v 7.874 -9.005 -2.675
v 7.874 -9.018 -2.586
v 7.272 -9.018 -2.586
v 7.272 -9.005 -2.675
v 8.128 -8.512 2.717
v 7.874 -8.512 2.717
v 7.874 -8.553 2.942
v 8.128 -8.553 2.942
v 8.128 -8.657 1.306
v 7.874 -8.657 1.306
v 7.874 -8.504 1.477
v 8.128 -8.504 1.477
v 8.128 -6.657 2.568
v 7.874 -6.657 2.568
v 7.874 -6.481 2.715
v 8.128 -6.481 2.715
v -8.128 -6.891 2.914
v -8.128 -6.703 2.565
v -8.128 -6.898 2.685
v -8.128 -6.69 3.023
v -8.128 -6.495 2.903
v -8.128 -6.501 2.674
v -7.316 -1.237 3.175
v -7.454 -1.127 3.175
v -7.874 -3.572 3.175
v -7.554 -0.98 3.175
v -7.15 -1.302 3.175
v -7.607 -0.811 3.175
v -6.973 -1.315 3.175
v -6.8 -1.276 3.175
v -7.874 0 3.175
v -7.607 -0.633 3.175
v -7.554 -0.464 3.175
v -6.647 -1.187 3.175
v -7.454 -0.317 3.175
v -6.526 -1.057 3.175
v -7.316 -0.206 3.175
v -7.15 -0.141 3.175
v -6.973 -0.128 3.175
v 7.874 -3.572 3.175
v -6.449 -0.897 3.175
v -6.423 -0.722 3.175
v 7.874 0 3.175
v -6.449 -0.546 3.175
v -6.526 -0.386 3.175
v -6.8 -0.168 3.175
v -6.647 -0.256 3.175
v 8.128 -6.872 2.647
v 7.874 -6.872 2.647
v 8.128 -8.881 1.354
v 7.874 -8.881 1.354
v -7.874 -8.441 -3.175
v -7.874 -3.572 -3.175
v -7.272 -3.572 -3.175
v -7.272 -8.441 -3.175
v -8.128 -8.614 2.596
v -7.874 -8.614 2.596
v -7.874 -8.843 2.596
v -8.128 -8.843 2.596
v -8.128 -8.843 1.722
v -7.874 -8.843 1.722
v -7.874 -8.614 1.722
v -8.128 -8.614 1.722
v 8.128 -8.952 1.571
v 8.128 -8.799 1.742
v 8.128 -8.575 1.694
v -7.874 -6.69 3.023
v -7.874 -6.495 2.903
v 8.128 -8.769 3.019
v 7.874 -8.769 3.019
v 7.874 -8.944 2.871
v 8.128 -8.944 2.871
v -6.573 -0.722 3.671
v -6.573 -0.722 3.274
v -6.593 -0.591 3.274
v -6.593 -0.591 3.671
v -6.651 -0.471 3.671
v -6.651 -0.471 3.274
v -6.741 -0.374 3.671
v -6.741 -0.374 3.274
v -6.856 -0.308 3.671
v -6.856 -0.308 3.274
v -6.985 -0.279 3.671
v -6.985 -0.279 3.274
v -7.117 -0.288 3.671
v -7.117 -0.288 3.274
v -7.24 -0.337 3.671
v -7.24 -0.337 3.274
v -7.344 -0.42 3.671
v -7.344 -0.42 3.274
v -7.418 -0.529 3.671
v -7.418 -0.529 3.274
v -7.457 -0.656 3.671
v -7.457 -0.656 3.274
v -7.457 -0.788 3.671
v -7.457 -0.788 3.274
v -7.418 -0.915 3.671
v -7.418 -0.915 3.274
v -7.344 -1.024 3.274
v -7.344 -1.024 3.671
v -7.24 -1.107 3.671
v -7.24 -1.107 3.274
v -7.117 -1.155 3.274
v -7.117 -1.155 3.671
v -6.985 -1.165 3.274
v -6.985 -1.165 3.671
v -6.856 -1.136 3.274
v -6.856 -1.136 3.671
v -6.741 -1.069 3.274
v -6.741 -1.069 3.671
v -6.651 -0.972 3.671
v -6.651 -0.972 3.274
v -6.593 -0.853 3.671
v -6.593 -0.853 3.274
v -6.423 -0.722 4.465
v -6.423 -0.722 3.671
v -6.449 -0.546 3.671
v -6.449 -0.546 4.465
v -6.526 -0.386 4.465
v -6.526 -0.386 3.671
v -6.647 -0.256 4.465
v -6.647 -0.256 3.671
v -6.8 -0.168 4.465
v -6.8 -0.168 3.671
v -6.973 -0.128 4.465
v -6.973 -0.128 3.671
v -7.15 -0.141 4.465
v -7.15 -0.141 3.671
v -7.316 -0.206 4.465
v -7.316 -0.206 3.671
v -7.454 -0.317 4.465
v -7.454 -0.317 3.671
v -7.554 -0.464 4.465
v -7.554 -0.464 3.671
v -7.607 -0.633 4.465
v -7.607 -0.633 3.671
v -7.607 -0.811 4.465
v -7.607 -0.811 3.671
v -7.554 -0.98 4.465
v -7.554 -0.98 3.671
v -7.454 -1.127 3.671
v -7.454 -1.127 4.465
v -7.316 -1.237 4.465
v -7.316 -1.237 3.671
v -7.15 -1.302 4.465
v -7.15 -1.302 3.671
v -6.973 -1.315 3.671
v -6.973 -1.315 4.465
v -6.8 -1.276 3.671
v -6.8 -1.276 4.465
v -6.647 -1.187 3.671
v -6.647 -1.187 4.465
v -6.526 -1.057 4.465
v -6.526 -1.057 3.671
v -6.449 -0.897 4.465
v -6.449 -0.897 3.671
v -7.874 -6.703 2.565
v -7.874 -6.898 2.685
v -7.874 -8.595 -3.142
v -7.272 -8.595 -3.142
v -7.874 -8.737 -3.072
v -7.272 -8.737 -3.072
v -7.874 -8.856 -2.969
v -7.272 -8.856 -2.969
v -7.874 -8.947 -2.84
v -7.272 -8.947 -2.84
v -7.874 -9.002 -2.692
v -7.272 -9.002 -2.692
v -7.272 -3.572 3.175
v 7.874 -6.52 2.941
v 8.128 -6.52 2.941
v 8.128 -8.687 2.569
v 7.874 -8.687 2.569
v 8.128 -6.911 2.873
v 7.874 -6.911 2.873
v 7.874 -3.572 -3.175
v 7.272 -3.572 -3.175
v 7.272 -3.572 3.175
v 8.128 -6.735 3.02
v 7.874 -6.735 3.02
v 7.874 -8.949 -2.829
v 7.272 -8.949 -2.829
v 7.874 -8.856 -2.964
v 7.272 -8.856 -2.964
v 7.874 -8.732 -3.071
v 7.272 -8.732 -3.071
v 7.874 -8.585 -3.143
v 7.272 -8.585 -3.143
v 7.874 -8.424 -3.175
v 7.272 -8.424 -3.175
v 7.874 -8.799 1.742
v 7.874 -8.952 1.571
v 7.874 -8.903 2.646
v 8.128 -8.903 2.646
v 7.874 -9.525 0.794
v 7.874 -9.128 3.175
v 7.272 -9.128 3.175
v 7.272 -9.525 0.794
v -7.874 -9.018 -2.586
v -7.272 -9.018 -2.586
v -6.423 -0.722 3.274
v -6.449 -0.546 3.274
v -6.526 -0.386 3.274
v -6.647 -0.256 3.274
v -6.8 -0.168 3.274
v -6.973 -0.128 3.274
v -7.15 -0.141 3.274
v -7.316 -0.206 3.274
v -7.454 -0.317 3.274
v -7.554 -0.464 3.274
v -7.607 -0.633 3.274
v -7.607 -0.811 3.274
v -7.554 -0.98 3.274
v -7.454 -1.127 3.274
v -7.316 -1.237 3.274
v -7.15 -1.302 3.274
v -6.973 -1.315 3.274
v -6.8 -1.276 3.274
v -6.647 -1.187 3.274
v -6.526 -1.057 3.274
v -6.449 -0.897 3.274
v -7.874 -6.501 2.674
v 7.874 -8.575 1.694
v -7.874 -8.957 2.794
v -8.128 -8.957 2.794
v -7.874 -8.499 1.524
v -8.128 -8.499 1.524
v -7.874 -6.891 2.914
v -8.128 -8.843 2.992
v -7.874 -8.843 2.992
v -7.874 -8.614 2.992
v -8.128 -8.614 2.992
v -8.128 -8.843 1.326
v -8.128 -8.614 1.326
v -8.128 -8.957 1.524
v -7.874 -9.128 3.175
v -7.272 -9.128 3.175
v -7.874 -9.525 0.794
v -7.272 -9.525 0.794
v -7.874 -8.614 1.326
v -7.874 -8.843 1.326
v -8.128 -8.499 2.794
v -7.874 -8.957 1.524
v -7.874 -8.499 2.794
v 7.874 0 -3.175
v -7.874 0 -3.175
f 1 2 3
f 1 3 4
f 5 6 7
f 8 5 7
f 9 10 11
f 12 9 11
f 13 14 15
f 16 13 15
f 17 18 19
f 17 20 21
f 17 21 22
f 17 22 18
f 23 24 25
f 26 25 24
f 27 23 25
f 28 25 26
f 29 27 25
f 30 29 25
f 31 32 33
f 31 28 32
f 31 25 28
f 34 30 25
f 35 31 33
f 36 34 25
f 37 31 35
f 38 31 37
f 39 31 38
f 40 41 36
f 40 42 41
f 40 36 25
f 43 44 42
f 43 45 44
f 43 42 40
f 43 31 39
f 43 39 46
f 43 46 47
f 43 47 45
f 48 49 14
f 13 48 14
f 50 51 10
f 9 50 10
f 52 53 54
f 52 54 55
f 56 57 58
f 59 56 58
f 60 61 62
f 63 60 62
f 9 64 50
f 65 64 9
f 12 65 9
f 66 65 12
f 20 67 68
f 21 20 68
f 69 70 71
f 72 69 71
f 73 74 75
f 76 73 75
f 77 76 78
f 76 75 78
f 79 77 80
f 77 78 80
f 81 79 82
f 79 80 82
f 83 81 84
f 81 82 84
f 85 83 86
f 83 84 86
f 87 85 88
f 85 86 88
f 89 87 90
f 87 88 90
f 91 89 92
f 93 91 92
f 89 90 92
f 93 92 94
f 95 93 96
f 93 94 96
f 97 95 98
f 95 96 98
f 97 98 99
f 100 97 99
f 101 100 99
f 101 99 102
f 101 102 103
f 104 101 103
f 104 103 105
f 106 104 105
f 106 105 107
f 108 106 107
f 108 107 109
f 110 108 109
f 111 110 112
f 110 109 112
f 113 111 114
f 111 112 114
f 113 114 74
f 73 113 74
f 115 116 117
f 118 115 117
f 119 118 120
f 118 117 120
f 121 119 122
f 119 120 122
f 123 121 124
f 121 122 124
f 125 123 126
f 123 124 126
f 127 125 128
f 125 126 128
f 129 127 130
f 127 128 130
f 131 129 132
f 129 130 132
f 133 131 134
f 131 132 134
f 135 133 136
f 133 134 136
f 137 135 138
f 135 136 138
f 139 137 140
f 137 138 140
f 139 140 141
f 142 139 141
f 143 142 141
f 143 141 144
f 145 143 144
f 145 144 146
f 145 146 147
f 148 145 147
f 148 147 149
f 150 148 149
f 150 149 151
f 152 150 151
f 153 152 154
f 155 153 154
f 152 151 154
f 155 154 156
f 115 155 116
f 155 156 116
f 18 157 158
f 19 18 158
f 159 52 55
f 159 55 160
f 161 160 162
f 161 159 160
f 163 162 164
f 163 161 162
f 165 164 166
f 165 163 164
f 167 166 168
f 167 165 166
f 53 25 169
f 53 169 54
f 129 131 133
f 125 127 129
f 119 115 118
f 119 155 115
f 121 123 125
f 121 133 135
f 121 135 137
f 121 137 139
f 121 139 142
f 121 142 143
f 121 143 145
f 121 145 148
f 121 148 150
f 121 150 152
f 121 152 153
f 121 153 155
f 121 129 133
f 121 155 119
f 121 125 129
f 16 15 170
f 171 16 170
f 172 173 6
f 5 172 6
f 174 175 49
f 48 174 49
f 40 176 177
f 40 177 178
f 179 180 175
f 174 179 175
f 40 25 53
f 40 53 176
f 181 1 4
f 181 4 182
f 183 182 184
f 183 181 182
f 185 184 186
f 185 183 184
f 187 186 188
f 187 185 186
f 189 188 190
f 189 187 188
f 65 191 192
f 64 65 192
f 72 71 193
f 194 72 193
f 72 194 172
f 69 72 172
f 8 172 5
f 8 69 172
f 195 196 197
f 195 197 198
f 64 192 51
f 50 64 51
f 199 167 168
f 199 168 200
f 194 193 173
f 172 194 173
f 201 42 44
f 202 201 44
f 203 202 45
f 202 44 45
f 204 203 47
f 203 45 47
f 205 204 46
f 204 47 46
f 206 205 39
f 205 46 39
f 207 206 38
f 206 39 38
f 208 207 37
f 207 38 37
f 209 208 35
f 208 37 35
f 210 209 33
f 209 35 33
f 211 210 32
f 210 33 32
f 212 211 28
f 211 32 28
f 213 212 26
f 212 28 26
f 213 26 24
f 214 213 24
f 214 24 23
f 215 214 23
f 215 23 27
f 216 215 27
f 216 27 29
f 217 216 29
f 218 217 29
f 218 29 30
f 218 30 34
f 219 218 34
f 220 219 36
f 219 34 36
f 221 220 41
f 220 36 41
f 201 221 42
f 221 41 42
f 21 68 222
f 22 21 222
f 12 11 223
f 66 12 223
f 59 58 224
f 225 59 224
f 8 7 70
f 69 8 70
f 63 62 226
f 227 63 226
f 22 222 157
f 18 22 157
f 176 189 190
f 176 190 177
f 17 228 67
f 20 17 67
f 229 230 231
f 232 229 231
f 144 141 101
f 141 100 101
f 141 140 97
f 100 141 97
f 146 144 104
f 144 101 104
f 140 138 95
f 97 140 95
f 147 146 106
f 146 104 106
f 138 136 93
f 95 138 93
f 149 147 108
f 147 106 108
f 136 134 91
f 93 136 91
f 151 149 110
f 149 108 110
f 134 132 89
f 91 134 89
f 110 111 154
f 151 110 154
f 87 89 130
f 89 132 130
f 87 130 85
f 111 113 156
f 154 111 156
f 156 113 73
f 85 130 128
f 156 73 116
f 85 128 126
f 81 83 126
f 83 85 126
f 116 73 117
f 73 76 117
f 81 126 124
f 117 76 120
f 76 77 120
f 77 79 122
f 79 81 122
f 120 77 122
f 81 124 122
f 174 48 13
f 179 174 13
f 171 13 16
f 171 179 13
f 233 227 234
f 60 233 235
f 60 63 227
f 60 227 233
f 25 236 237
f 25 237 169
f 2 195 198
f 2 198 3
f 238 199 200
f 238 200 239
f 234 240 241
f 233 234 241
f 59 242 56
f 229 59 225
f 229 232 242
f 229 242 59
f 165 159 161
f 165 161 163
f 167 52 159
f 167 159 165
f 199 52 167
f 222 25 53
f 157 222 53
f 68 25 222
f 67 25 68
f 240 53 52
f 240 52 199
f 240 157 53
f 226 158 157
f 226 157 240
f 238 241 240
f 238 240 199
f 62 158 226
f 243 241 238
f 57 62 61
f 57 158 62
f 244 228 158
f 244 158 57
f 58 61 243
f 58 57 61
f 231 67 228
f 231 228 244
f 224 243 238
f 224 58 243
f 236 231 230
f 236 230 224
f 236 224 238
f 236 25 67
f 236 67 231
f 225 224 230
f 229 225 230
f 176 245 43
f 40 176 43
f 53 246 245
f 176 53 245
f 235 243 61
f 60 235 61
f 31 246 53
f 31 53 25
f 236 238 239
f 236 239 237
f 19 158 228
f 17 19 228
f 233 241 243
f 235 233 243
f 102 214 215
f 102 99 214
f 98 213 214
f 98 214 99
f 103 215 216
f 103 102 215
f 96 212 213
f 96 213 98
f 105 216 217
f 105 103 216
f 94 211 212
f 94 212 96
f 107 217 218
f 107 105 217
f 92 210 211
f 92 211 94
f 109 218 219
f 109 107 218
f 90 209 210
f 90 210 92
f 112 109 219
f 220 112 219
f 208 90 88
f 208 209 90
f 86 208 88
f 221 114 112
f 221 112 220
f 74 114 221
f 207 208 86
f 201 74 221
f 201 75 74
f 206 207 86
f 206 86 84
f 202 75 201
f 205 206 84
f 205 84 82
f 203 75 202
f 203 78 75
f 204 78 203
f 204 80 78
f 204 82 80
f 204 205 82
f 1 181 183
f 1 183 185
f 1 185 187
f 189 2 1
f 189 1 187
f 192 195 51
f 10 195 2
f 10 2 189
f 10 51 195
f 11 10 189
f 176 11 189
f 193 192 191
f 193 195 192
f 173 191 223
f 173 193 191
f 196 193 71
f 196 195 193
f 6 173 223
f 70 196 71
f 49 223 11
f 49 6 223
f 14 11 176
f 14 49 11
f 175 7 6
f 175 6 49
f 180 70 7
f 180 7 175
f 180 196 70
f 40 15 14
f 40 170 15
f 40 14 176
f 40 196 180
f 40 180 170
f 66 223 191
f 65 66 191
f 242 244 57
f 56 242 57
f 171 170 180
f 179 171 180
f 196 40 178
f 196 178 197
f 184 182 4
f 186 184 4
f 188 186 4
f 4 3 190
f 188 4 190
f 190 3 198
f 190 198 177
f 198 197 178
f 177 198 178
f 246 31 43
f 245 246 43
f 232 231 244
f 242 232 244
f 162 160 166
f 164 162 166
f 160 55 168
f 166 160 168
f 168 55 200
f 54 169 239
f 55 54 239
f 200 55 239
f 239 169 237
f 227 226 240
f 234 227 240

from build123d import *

# Parameters (mm, degrees)
F0_W      = 15.748
F0_H      = 6.35
F1_DEPTH  = 3.571875
F3_DEPTH  = 0.60198
F5_DEPTH  = 0.60198
F6_R      = 0.5953125
F7_DEPTH  = 0.09921748
F8_R      = 0.4445
F9_DEPTH  = 0.396875
F11_DEPTH = 0.254
F12_DEPTH = 0.254
F13_DEPTH = 0.254
F15_DEPTH = 0.254
F16_DEPTH = 0.254
F17_DEPTH = 0.254
F18_R     = 0.5953125
F18_R_2   = 0.4445
F19_DEPTH = 0.79375


with BuildPart() as f1:
    # F0 (on Front) → F1 (new body)
    with BuildSketch(Plane.XZ):
        Rectangle(F0_W, F0_H)
    extrude(amount=F1_DEPTH)

    # F6 (on face) → F7 (join)
    with BuildSketch(Plane.XY.offset(3.175)):
        with Locations((-7.017956581, -0.7218440296)):
            Circle(F6_R)
    extrude(amount=F7_DEPTH)

    # F8 (on face) → F9 (join)
    with BuildSketch(Plane.XY.offset(3.27421748)):
        with Locations((-7.017956581, -0.7218440296)):
            Circle(F8_R)
    extrude(amount=F9_DEPTH)

    # F18 (on face) → F19 (join)
    with BuildSketch(Plane.XY.offset(3.67109248)):
        with Locations((-7.017956581, -0.7218440296)):
            Circle(F18_R)
        with Locations((-7.017956581, -0.7218440296)):
            Circle(F18_R_2, mode=Mode.SUBTRACT)
        with Locations((-7.017956581, -0.7218440296)):
            Circle(F18_R_2)
    extrude(amount=F19_DEPTH)


with BuildPart() as f3:
    # F2 (on face) → F3 (new body)
    with BuildSketch(Plane(origin=(-7.874, 0, 0), x_dir=(0, -1, 0), z_dir=(-1, 0, 0))):
        with BuildLine():
            Line((9.128125, 3.175), (3.571875, 3.175))
            Line((3.571875, 3.175), (3.571875, -3.175))
            Line((3.571875, -3.175), (8.334375, -3.175))
            Line((8.334375, -3.175), (8.4411502676, -3.175))
            ThreePointArc((8.4411502676, -3.175), (8.799876088, -3.0242646213), (9.0021573343, -2.6918677712))
            Line((9.0021573343, -2.6918677712), (9.0179964259, -2.5862738274))
            Line((9.0179964259, -2.5862738274), (9.525, 0.79375))
            Line((9.525, 0.79375), (9.128125, 3.175))
        make_face()
    extrude(amount=-F3_DEPTH)

    # F10 (on face) → F11 (join)
    with BuildSketch(Plane(origin=(-7.874, 0, 0), x_dir=(0, -1, 0), z_dir=(-1, 0, 0))):
        Polygon((8.6135505511, 2.5955625), (8.8426864392, 2.5955625), (8.9572543833, 2.794), (8.8426864392, 2.9924375), (8.6135505511, 2.9924375), (8.4989826071, 2.794), align=None)
    extrude(amount=F11_DEPTH)

    # F10 (on face) → F12 (join)
    with BuildSketch(Plane(origin=(-7.874, 0, 0), x_dir=(0, -1, 0), z_dir=(-1, 0, 0))):
        Polygon((8.8426864392, 1.3255625), (8.9572543833, 1.524), (8.8426864392, 1.7224375), (8.6135505511, 1.7224375), (8.4989826071, 1.524), (8.6135505511, 1.3255625), align=None)
    extrude(amount=F12_DEPTH)

    # F10 (on face) → F13 (join)
    with BuildSketch(Plane(origin=(-7.874, 0, 0), x_dir=(0, -1, 0), z_dir=(-1, 0, 0))):
        Polygon((6.7025459962, 2.5649542787), (6.897691659, 2.6850435185), (6.8912641579, 2.9140892398), (6.6896909942, 3.0230457213), (6.4945453314, 2.9029564815), (6.5009728324, 2.6739107602), align=None)
    extrude(amount=F13_DEPTH)


with BuildPart() as f5:
    # F4 (on face) → F5 (new body)
    with BuildSketch(Plane.YZ.offset(7.874)):
        with BuildLine():
            Line((-3.571875, -3.175), (-3.571875, 3.175))
            Line((-3.571875, 3.175), (-9.128125, 3.175))
            Line((-9.128125, 3.175), (-9.525, 0.79375))
            Line((-9.525, 0.79375), (-9.0179964259, -2.5862738274))
            Line((-9.0179964259, -2.5862738274), (-9.0046285555, -2.6753929631))
            ThreePointArc((-9.0046285555, -2.6753929631), (-8.7974184271, -3.0214108164), (-8.4244911489, -3.175))
            Line((-8.4244911489, -3.175), (-8.334375, -3.175))
            Line((-8.334375, -3.175), (-3.571875, -3.175))
        make_face()
    extrude(amount=-F5_DEPTH)

    # F14 (on face) → F15 (join)
    with BuildSketch(Plane.YZ.offset(7.874)):
        Polygon((-8.6870932965, 2.5685666656), (-8.5123749013, 2.7168121971), (-8.5534001001, 2.9422455315), (-8.7691436939, 3.0194333344), (-8.943862089, 2.8711878029), (-8.9028368903, 2.6457544685), align=None)
    extrude(amount=F15_DEPTH)

    # F14 (on face) → F16 (join)
    with BuildSketch(Plane.YZ.offset(7.874)):
        Polygon((-6.6569290081, 2.5682403063), (-6.4810101217, 2.7150592445), (-6.5201996088, 2.9408189382), (-6.7353079822, 3.0197596937), (-6.9112268686, 2.8729407555), (-6.8720373816, 2.6471810618), align=None)
    extrude(amount=F16_DEPTH)

    # F14 (on face) → F17 (join)
    with BuildSketch(Plane.YZ.offset(7.874)):
        Polygon((-8.5750005157, 1.6944644819), (-8.7991860772, 1.7418363009), (-8.9523040567, 1.5713718191), (-8.8812364747, 1.3535355181), (-8.6570509132, 1.3061636991), (-8.5039329337, 1.4766281809), align=None)
    extrude(amount=F17_DEPTH)


solid = Compound([f1.part, f3.part, f5.part])
